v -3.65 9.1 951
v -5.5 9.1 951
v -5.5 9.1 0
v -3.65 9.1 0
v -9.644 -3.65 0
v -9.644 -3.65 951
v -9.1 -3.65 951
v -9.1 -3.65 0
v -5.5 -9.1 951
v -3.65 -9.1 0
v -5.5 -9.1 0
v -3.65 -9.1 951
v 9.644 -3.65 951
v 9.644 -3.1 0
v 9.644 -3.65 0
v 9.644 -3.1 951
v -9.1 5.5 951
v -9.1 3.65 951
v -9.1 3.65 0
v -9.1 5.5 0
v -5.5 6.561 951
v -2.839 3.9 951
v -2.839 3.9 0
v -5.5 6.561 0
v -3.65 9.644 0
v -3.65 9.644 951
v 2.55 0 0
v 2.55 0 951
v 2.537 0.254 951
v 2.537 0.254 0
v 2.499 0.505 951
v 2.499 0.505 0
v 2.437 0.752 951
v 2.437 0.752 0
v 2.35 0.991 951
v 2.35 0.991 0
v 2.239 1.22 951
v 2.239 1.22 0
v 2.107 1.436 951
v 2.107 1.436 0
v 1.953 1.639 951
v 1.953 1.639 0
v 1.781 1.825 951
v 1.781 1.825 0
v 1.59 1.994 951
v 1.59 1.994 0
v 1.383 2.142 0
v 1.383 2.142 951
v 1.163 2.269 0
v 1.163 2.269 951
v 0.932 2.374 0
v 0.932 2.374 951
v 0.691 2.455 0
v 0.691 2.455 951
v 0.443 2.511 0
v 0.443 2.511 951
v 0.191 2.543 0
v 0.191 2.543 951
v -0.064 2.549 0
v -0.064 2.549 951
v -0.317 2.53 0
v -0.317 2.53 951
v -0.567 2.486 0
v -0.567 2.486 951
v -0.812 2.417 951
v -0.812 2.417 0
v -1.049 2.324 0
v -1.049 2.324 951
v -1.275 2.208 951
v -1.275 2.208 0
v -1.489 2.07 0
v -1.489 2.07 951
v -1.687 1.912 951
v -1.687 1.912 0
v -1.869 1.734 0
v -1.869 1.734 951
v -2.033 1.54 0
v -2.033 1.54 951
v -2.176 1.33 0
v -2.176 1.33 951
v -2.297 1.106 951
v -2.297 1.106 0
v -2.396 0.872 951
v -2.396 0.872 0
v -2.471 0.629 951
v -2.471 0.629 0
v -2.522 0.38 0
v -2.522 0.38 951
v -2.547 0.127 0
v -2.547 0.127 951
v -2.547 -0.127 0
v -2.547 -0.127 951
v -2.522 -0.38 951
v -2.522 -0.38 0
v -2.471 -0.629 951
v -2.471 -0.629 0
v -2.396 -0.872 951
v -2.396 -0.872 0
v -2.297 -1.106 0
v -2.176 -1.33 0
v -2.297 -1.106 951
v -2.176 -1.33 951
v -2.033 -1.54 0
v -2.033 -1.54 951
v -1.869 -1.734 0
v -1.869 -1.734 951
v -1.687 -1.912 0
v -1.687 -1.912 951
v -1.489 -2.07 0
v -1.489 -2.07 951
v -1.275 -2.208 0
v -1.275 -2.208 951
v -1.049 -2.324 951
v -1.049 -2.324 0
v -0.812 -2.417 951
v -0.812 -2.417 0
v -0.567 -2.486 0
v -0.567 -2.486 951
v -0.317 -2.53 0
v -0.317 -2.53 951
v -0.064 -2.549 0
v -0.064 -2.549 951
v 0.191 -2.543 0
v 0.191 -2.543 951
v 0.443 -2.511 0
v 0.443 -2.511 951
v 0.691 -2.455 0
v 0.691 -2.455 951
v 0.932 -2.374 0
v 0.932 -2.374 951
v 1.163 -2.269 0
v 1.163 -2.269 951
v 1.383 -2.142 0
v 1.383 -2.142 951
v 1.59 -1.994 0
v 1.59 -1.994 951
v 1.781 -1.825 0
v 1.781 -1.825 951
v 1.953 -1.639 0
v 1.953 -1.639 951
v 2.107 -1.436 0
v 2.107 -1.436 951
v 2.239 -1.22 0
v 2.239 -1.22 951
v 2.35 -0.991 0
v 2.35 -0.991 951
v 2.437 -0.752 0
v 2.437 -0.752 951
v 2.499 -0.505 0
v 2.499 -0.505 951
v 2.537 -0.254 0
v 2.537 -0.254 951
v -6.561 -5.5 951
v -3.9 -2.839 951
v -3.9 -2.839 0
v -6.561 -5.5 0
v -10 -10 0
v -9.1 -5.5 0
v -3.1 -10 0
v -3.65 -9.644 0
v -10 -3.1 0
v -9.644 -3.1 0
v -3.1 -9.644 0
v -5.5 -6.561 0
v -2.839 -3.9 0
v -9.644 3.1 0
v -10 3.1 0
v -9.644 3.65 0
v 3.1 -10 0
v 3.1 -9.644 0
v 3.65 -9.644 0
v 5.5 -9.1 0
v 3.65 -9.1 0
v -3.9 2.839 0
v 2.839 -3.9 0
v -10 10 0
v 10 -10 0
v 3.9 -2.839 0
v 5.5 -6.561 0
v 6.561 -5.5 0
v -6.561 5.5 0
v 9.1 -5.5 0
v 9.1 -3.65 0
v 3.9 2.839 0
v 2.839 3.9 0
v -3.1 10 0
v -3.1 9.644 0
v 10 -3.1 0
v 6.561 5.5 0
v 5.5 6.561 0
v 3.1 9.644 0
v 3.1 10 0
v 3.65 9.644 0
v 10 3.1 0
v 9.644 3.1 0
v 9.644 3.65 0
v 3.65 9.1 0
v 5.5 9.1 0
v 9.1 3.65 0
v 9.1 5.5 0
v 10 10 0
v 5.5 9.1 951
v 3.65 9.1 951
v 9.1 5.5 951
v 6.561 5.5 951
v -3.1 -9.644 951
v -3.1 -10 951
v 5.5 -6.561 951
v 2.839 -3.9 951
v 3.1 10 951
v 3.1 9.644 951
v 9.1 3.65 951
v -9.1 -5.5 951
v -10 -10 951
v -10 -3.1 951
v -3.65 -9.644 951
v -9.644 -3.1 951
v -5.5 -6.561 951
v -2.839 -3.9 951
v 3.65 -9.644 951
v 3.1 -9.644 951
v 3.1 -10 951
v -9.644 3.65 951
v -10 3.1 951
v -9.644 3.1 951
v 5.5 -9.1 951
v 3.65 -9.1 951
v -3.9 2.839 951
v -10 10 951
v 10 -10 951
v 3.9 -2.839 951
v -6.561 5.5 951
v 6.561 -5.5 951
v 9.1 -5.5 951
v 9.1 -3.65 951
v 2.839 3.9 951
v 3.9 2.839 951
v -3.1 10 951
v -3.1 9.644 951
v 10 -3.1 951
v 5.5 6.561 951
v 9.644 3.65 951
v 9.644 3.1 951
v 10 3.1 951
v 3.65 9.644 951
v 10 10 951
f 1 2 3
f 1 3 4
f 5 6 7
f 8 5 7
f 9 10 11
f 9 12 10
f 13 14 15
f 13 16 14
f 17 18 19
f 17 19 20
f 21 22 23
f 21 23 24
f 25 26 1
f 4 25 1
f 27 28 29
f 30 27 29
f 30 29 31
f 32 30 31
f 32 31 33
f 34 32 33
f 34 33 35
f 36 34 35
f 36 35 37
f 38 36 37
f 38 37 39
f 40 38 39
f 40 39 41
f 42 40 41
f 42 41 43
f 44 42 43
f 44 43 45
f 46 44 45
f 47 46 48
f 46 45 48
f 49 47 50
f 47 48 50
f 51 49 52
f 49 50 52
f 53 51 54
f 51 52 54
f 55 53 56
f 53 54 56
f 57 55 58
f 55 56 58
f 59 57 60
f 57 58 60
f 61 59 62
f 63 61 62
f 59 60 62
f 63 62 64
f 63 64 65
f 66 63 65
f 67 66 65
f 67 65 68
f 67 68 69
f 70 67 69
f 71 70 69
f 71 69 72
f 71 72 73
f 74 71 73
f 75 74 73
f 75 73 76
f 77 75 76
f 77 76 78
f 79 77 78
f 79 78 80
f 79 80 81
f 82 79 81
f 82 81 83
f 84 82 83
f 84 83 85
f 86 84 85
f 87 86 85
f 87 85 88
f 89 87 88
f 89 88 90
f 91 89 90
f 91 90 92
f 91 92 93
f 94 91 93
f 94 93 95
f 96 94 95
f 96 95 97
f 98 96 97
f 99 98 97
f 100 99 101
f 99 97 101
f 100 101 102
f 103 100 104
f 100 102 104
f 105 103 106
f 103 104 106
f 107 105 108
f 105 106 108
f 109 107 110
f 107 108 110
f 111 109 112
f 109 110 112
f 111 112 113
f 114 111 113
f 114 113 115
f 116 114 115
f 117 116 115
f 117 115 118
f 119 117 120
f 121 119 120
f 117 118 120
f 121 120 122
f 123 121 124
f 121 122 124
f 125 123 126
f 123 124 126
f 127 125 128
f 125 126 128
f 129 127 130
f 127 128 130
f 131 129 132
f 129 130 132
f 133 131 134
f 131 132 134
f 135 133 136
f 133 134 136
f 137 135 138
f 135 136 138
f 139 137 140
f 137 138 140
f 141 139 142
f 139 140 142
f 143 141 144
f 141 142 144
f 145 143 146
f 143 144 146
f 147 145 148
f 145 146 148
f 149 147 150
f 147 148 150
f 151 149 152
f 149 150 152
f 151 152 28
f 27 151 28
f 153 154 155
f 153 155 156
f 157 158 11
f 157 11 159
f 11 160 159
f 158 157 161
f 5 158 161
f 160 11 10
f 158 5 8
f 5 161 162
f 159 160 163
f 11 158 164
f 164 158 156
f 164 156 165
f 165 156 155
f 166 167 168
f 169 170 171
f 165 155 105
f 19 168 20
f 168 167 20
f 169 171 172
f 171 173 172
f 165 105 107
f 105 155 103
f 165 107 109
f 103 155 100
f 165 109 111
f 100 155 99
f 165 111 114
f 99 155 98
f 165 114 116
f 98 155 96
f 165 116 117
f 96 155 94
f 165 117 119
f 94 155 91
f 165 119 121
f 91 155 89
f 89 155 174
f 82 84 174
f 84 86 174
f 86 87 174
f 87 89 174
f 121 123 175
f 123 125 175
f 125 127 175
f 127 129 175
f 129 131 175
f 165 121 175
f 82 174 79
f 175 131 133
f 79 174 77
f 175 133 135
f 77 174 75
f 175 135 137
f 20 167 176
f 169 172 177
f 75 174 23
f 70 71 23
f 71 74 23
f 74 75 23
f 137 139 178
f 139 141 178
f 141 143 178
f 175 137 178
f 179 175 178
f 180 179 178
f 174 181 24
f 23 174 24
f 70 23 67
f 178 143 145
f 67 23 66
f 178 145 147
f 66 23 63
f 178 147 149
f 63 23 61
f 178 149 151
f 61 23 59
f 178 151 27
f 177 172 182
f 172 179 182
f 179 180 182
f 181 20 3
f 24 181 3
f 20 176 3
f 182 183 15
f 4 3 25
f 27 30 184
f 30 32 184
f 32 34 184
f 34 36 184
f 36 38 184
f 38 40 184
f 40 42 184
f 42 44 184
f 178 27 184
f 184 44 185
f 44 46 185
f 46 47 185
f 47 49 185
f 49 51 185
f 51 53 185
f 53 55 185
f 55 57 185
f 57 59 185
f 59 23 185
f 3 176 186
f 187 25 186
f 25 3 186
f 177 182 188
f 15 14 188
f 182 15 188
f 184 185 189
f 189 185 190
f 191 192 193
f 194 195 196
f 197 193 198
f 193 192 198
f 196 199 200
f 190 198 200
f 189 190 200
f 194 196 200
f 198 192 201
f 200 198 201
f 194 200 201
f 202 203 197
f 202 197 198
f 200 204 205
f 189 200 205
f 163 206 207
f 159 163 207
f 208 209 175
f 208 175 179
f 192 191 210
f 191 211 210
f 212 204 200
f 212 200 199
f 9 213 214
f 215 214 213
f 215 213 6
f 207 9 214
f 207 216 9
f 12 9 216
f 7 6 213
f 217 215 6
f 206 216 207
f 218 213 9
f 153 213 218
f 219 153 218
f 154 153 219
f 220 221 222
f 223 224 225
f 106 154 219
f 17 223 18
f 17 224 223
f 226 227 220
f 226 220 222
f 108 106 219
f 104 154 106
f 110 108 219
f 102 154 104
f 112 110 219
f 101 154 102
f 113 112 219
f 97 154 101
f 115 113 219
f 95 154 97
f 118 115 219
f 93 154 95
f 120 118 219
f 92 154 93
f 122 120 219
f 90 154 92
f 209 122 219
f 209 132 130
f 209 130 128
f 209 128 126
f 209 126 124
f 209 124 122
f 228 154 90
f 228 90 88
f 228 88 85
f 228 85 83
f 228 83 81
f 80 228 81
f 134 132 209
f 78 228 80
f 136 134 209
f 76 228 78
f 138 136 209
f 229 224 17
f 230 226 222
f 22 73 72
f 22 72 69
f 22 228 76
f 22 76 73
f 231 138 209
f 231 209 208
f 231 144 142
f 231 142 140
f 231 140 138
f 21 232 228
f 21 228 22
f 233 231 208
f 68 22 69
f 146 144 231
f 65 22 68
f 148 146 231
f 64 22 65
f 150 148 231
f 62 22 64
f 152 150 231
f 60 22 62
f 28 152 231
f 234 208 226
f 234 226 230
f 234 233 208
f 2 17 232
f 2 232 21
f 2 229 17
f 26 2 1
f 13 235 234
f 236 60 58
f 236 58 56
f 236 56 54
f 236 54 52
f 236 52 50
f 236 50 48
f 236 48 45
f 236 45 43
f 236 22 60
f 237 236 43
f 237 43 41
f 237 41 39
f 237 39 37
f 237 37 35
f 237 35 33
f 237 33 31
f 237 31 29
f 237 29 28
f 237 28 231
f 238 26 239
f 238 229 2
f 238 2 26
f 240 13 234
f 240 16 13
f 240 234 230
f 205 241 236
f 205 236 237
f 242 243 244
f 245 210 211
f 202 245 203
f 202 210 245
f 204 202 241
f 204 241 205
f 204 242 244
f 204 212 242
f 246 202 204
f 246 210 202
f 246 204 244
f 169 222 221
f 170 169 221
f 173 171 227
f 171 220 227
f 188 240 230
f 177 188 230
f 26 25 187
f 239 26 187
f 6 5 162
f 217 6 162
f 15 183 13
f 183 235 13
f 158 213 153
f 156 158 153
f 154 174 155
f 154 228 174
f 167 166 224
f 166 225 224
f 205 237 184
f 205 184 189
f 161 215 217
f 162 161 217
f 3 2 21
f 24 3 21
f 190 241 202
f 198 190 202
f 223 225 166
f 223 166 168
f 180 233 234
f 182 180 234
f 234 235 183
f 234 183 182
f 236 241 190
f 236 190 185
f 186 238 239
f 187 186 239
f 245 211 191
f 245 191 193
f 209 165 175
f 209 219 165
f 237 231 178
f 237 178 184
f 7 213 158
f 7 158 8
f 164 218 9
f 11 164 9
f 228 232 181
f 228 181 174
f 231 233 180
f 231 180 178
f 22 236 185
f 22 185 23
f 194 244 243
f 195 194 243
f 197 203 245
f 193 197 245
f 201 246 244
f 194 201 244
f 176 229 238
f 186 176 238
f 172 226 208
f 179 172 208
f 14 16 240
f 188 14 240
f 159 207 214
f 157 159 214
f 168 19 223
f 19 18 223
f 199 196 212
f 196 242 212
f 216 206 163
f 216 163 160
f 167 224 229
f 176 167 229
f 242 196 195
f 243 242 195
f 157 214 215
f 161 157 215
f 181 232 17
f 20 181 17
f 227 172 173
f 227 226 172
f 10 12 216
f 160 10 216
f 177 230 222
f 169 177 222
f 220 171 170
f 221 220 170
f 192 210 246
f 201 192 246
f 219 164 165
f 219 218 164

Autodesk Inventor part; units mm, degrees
ref_plane "YZ Plane" through (0, 0, 0) normal (1, 0, 0) x (0, 1, 0)
ref_plane "XZ Plane" through (0, 0, 0) normal (0, 1, 0) x (-1, 0, 0)
ref_plane "XY Plane" through (0, 0, 0) normal (0, 0, 1) x (1, 0, 0)
sketch "草图1" plane through (0, 0, 0) normal (0, 0, 1) x (1, 0, 0)
  line L0 (10, -10) -> (-10, -10)
  line L1 (-10, -10) -> (-10, 10)
  line L2 (-10, 10) -> (10, 10)
  line L3 (10, 10) -> (10, -10)
  line L4 (10, -10) -> (-10, 10) construction
  line L5 (-10, -10) -> (10, 10) construction
  point P0 (0, 0)
  dimension "d0" = 20
  dimension "d1" = 20
extrude "拉伸1" add sketch "草图1" along normal blind 951
sketch "草图2" plane through (0, 0, 951) normal (0, 0, 1) x (1, 0, 0)
  circle A0 centre (0, 0) radius 2.55
  line L0 (-11.0615, 0) -> (0, 0)
  line L1 (0, 0) -> (0, 11.55)
  line L2 (-10, 10) -> (-10, -10) projected
  line L3 (10, 10) -> (-10, 10) projected
  line L4 (0, 3.9) -> (-3.9, 3.9)
  line L5 (-3.9, 3.9) -> (-3.9, 0)
  line L6 (-10, 10) -> (0, 0)
  line L7 (0, 1.0607) -> (-8.9393, 10)
  line L8 (-1.0607, 0) -> (-10, 8.9393)
  line L9 (-10, 10) -> (-3.1, 10)
  line L10 (-10, 3.1) -> (-10, 10)
  line L11 (-10, 10) -> (-3.65, 10)
  line L12 (-10, 3.65) -> (-10, 10)
  line L13 (-5.5, 12.0125) -> (-5.5, 5.5)
  line L14 (-10, 10) -> (-5.5, 10)
  line L15 (-5.5, 10) -> (-5.5, 5.5)
  line L16 (-5.5, 5.5) -> (-10, 5.5)
  line L17 (-10, 5.5) -> (-10, 10)
  line L18 (-5.5, 9.1) -> (0, 9.1)
  line L19 (-3.65, 10) -> (-3.65, 9.1)
  line L20 (-3.1, 10) -> (-3.1, 9.1)
  line L21 (-3.65, 9.6441) -> (-3.1, 9.6441)
  point P0 (-3.1, 9.55)
  point P1 (-5.5, 6.5607)
  point P2 (-2.8393, 3.9)
  point P3 (0, 10)
  dimension "d4" = 5.1
  dimension "d5" = 6.1
  dimension "d6" = 1.5
  dimension "d9" = 5.5
  dimension "d10" = 0.9
  dimension "d11" = 3.1
  dimension "d12" = 3.65
extrude "拉伸2" cut sketch "草图2" against normal up to surface (951 mm away) contours A0 L0 L1 | L1 L7 A0 | A0 L8 L0 | L7 L1 L6 A0 | L4 L7 L13 L18 L1 | A0 L6 L0 L8 | L18 L20 L3 L1 | L18 L19 L21 L20
mirror "镜像1" about plane through (0, 10, 951) normal (-1, 0, 0) of "拉伸2"
pattern_circular "环形阵列1" count 4 over 360 about axis through (0, 0, 951) along (0, 0, -1) of "拉伸2", "镜像1"
properties part number "框架"
